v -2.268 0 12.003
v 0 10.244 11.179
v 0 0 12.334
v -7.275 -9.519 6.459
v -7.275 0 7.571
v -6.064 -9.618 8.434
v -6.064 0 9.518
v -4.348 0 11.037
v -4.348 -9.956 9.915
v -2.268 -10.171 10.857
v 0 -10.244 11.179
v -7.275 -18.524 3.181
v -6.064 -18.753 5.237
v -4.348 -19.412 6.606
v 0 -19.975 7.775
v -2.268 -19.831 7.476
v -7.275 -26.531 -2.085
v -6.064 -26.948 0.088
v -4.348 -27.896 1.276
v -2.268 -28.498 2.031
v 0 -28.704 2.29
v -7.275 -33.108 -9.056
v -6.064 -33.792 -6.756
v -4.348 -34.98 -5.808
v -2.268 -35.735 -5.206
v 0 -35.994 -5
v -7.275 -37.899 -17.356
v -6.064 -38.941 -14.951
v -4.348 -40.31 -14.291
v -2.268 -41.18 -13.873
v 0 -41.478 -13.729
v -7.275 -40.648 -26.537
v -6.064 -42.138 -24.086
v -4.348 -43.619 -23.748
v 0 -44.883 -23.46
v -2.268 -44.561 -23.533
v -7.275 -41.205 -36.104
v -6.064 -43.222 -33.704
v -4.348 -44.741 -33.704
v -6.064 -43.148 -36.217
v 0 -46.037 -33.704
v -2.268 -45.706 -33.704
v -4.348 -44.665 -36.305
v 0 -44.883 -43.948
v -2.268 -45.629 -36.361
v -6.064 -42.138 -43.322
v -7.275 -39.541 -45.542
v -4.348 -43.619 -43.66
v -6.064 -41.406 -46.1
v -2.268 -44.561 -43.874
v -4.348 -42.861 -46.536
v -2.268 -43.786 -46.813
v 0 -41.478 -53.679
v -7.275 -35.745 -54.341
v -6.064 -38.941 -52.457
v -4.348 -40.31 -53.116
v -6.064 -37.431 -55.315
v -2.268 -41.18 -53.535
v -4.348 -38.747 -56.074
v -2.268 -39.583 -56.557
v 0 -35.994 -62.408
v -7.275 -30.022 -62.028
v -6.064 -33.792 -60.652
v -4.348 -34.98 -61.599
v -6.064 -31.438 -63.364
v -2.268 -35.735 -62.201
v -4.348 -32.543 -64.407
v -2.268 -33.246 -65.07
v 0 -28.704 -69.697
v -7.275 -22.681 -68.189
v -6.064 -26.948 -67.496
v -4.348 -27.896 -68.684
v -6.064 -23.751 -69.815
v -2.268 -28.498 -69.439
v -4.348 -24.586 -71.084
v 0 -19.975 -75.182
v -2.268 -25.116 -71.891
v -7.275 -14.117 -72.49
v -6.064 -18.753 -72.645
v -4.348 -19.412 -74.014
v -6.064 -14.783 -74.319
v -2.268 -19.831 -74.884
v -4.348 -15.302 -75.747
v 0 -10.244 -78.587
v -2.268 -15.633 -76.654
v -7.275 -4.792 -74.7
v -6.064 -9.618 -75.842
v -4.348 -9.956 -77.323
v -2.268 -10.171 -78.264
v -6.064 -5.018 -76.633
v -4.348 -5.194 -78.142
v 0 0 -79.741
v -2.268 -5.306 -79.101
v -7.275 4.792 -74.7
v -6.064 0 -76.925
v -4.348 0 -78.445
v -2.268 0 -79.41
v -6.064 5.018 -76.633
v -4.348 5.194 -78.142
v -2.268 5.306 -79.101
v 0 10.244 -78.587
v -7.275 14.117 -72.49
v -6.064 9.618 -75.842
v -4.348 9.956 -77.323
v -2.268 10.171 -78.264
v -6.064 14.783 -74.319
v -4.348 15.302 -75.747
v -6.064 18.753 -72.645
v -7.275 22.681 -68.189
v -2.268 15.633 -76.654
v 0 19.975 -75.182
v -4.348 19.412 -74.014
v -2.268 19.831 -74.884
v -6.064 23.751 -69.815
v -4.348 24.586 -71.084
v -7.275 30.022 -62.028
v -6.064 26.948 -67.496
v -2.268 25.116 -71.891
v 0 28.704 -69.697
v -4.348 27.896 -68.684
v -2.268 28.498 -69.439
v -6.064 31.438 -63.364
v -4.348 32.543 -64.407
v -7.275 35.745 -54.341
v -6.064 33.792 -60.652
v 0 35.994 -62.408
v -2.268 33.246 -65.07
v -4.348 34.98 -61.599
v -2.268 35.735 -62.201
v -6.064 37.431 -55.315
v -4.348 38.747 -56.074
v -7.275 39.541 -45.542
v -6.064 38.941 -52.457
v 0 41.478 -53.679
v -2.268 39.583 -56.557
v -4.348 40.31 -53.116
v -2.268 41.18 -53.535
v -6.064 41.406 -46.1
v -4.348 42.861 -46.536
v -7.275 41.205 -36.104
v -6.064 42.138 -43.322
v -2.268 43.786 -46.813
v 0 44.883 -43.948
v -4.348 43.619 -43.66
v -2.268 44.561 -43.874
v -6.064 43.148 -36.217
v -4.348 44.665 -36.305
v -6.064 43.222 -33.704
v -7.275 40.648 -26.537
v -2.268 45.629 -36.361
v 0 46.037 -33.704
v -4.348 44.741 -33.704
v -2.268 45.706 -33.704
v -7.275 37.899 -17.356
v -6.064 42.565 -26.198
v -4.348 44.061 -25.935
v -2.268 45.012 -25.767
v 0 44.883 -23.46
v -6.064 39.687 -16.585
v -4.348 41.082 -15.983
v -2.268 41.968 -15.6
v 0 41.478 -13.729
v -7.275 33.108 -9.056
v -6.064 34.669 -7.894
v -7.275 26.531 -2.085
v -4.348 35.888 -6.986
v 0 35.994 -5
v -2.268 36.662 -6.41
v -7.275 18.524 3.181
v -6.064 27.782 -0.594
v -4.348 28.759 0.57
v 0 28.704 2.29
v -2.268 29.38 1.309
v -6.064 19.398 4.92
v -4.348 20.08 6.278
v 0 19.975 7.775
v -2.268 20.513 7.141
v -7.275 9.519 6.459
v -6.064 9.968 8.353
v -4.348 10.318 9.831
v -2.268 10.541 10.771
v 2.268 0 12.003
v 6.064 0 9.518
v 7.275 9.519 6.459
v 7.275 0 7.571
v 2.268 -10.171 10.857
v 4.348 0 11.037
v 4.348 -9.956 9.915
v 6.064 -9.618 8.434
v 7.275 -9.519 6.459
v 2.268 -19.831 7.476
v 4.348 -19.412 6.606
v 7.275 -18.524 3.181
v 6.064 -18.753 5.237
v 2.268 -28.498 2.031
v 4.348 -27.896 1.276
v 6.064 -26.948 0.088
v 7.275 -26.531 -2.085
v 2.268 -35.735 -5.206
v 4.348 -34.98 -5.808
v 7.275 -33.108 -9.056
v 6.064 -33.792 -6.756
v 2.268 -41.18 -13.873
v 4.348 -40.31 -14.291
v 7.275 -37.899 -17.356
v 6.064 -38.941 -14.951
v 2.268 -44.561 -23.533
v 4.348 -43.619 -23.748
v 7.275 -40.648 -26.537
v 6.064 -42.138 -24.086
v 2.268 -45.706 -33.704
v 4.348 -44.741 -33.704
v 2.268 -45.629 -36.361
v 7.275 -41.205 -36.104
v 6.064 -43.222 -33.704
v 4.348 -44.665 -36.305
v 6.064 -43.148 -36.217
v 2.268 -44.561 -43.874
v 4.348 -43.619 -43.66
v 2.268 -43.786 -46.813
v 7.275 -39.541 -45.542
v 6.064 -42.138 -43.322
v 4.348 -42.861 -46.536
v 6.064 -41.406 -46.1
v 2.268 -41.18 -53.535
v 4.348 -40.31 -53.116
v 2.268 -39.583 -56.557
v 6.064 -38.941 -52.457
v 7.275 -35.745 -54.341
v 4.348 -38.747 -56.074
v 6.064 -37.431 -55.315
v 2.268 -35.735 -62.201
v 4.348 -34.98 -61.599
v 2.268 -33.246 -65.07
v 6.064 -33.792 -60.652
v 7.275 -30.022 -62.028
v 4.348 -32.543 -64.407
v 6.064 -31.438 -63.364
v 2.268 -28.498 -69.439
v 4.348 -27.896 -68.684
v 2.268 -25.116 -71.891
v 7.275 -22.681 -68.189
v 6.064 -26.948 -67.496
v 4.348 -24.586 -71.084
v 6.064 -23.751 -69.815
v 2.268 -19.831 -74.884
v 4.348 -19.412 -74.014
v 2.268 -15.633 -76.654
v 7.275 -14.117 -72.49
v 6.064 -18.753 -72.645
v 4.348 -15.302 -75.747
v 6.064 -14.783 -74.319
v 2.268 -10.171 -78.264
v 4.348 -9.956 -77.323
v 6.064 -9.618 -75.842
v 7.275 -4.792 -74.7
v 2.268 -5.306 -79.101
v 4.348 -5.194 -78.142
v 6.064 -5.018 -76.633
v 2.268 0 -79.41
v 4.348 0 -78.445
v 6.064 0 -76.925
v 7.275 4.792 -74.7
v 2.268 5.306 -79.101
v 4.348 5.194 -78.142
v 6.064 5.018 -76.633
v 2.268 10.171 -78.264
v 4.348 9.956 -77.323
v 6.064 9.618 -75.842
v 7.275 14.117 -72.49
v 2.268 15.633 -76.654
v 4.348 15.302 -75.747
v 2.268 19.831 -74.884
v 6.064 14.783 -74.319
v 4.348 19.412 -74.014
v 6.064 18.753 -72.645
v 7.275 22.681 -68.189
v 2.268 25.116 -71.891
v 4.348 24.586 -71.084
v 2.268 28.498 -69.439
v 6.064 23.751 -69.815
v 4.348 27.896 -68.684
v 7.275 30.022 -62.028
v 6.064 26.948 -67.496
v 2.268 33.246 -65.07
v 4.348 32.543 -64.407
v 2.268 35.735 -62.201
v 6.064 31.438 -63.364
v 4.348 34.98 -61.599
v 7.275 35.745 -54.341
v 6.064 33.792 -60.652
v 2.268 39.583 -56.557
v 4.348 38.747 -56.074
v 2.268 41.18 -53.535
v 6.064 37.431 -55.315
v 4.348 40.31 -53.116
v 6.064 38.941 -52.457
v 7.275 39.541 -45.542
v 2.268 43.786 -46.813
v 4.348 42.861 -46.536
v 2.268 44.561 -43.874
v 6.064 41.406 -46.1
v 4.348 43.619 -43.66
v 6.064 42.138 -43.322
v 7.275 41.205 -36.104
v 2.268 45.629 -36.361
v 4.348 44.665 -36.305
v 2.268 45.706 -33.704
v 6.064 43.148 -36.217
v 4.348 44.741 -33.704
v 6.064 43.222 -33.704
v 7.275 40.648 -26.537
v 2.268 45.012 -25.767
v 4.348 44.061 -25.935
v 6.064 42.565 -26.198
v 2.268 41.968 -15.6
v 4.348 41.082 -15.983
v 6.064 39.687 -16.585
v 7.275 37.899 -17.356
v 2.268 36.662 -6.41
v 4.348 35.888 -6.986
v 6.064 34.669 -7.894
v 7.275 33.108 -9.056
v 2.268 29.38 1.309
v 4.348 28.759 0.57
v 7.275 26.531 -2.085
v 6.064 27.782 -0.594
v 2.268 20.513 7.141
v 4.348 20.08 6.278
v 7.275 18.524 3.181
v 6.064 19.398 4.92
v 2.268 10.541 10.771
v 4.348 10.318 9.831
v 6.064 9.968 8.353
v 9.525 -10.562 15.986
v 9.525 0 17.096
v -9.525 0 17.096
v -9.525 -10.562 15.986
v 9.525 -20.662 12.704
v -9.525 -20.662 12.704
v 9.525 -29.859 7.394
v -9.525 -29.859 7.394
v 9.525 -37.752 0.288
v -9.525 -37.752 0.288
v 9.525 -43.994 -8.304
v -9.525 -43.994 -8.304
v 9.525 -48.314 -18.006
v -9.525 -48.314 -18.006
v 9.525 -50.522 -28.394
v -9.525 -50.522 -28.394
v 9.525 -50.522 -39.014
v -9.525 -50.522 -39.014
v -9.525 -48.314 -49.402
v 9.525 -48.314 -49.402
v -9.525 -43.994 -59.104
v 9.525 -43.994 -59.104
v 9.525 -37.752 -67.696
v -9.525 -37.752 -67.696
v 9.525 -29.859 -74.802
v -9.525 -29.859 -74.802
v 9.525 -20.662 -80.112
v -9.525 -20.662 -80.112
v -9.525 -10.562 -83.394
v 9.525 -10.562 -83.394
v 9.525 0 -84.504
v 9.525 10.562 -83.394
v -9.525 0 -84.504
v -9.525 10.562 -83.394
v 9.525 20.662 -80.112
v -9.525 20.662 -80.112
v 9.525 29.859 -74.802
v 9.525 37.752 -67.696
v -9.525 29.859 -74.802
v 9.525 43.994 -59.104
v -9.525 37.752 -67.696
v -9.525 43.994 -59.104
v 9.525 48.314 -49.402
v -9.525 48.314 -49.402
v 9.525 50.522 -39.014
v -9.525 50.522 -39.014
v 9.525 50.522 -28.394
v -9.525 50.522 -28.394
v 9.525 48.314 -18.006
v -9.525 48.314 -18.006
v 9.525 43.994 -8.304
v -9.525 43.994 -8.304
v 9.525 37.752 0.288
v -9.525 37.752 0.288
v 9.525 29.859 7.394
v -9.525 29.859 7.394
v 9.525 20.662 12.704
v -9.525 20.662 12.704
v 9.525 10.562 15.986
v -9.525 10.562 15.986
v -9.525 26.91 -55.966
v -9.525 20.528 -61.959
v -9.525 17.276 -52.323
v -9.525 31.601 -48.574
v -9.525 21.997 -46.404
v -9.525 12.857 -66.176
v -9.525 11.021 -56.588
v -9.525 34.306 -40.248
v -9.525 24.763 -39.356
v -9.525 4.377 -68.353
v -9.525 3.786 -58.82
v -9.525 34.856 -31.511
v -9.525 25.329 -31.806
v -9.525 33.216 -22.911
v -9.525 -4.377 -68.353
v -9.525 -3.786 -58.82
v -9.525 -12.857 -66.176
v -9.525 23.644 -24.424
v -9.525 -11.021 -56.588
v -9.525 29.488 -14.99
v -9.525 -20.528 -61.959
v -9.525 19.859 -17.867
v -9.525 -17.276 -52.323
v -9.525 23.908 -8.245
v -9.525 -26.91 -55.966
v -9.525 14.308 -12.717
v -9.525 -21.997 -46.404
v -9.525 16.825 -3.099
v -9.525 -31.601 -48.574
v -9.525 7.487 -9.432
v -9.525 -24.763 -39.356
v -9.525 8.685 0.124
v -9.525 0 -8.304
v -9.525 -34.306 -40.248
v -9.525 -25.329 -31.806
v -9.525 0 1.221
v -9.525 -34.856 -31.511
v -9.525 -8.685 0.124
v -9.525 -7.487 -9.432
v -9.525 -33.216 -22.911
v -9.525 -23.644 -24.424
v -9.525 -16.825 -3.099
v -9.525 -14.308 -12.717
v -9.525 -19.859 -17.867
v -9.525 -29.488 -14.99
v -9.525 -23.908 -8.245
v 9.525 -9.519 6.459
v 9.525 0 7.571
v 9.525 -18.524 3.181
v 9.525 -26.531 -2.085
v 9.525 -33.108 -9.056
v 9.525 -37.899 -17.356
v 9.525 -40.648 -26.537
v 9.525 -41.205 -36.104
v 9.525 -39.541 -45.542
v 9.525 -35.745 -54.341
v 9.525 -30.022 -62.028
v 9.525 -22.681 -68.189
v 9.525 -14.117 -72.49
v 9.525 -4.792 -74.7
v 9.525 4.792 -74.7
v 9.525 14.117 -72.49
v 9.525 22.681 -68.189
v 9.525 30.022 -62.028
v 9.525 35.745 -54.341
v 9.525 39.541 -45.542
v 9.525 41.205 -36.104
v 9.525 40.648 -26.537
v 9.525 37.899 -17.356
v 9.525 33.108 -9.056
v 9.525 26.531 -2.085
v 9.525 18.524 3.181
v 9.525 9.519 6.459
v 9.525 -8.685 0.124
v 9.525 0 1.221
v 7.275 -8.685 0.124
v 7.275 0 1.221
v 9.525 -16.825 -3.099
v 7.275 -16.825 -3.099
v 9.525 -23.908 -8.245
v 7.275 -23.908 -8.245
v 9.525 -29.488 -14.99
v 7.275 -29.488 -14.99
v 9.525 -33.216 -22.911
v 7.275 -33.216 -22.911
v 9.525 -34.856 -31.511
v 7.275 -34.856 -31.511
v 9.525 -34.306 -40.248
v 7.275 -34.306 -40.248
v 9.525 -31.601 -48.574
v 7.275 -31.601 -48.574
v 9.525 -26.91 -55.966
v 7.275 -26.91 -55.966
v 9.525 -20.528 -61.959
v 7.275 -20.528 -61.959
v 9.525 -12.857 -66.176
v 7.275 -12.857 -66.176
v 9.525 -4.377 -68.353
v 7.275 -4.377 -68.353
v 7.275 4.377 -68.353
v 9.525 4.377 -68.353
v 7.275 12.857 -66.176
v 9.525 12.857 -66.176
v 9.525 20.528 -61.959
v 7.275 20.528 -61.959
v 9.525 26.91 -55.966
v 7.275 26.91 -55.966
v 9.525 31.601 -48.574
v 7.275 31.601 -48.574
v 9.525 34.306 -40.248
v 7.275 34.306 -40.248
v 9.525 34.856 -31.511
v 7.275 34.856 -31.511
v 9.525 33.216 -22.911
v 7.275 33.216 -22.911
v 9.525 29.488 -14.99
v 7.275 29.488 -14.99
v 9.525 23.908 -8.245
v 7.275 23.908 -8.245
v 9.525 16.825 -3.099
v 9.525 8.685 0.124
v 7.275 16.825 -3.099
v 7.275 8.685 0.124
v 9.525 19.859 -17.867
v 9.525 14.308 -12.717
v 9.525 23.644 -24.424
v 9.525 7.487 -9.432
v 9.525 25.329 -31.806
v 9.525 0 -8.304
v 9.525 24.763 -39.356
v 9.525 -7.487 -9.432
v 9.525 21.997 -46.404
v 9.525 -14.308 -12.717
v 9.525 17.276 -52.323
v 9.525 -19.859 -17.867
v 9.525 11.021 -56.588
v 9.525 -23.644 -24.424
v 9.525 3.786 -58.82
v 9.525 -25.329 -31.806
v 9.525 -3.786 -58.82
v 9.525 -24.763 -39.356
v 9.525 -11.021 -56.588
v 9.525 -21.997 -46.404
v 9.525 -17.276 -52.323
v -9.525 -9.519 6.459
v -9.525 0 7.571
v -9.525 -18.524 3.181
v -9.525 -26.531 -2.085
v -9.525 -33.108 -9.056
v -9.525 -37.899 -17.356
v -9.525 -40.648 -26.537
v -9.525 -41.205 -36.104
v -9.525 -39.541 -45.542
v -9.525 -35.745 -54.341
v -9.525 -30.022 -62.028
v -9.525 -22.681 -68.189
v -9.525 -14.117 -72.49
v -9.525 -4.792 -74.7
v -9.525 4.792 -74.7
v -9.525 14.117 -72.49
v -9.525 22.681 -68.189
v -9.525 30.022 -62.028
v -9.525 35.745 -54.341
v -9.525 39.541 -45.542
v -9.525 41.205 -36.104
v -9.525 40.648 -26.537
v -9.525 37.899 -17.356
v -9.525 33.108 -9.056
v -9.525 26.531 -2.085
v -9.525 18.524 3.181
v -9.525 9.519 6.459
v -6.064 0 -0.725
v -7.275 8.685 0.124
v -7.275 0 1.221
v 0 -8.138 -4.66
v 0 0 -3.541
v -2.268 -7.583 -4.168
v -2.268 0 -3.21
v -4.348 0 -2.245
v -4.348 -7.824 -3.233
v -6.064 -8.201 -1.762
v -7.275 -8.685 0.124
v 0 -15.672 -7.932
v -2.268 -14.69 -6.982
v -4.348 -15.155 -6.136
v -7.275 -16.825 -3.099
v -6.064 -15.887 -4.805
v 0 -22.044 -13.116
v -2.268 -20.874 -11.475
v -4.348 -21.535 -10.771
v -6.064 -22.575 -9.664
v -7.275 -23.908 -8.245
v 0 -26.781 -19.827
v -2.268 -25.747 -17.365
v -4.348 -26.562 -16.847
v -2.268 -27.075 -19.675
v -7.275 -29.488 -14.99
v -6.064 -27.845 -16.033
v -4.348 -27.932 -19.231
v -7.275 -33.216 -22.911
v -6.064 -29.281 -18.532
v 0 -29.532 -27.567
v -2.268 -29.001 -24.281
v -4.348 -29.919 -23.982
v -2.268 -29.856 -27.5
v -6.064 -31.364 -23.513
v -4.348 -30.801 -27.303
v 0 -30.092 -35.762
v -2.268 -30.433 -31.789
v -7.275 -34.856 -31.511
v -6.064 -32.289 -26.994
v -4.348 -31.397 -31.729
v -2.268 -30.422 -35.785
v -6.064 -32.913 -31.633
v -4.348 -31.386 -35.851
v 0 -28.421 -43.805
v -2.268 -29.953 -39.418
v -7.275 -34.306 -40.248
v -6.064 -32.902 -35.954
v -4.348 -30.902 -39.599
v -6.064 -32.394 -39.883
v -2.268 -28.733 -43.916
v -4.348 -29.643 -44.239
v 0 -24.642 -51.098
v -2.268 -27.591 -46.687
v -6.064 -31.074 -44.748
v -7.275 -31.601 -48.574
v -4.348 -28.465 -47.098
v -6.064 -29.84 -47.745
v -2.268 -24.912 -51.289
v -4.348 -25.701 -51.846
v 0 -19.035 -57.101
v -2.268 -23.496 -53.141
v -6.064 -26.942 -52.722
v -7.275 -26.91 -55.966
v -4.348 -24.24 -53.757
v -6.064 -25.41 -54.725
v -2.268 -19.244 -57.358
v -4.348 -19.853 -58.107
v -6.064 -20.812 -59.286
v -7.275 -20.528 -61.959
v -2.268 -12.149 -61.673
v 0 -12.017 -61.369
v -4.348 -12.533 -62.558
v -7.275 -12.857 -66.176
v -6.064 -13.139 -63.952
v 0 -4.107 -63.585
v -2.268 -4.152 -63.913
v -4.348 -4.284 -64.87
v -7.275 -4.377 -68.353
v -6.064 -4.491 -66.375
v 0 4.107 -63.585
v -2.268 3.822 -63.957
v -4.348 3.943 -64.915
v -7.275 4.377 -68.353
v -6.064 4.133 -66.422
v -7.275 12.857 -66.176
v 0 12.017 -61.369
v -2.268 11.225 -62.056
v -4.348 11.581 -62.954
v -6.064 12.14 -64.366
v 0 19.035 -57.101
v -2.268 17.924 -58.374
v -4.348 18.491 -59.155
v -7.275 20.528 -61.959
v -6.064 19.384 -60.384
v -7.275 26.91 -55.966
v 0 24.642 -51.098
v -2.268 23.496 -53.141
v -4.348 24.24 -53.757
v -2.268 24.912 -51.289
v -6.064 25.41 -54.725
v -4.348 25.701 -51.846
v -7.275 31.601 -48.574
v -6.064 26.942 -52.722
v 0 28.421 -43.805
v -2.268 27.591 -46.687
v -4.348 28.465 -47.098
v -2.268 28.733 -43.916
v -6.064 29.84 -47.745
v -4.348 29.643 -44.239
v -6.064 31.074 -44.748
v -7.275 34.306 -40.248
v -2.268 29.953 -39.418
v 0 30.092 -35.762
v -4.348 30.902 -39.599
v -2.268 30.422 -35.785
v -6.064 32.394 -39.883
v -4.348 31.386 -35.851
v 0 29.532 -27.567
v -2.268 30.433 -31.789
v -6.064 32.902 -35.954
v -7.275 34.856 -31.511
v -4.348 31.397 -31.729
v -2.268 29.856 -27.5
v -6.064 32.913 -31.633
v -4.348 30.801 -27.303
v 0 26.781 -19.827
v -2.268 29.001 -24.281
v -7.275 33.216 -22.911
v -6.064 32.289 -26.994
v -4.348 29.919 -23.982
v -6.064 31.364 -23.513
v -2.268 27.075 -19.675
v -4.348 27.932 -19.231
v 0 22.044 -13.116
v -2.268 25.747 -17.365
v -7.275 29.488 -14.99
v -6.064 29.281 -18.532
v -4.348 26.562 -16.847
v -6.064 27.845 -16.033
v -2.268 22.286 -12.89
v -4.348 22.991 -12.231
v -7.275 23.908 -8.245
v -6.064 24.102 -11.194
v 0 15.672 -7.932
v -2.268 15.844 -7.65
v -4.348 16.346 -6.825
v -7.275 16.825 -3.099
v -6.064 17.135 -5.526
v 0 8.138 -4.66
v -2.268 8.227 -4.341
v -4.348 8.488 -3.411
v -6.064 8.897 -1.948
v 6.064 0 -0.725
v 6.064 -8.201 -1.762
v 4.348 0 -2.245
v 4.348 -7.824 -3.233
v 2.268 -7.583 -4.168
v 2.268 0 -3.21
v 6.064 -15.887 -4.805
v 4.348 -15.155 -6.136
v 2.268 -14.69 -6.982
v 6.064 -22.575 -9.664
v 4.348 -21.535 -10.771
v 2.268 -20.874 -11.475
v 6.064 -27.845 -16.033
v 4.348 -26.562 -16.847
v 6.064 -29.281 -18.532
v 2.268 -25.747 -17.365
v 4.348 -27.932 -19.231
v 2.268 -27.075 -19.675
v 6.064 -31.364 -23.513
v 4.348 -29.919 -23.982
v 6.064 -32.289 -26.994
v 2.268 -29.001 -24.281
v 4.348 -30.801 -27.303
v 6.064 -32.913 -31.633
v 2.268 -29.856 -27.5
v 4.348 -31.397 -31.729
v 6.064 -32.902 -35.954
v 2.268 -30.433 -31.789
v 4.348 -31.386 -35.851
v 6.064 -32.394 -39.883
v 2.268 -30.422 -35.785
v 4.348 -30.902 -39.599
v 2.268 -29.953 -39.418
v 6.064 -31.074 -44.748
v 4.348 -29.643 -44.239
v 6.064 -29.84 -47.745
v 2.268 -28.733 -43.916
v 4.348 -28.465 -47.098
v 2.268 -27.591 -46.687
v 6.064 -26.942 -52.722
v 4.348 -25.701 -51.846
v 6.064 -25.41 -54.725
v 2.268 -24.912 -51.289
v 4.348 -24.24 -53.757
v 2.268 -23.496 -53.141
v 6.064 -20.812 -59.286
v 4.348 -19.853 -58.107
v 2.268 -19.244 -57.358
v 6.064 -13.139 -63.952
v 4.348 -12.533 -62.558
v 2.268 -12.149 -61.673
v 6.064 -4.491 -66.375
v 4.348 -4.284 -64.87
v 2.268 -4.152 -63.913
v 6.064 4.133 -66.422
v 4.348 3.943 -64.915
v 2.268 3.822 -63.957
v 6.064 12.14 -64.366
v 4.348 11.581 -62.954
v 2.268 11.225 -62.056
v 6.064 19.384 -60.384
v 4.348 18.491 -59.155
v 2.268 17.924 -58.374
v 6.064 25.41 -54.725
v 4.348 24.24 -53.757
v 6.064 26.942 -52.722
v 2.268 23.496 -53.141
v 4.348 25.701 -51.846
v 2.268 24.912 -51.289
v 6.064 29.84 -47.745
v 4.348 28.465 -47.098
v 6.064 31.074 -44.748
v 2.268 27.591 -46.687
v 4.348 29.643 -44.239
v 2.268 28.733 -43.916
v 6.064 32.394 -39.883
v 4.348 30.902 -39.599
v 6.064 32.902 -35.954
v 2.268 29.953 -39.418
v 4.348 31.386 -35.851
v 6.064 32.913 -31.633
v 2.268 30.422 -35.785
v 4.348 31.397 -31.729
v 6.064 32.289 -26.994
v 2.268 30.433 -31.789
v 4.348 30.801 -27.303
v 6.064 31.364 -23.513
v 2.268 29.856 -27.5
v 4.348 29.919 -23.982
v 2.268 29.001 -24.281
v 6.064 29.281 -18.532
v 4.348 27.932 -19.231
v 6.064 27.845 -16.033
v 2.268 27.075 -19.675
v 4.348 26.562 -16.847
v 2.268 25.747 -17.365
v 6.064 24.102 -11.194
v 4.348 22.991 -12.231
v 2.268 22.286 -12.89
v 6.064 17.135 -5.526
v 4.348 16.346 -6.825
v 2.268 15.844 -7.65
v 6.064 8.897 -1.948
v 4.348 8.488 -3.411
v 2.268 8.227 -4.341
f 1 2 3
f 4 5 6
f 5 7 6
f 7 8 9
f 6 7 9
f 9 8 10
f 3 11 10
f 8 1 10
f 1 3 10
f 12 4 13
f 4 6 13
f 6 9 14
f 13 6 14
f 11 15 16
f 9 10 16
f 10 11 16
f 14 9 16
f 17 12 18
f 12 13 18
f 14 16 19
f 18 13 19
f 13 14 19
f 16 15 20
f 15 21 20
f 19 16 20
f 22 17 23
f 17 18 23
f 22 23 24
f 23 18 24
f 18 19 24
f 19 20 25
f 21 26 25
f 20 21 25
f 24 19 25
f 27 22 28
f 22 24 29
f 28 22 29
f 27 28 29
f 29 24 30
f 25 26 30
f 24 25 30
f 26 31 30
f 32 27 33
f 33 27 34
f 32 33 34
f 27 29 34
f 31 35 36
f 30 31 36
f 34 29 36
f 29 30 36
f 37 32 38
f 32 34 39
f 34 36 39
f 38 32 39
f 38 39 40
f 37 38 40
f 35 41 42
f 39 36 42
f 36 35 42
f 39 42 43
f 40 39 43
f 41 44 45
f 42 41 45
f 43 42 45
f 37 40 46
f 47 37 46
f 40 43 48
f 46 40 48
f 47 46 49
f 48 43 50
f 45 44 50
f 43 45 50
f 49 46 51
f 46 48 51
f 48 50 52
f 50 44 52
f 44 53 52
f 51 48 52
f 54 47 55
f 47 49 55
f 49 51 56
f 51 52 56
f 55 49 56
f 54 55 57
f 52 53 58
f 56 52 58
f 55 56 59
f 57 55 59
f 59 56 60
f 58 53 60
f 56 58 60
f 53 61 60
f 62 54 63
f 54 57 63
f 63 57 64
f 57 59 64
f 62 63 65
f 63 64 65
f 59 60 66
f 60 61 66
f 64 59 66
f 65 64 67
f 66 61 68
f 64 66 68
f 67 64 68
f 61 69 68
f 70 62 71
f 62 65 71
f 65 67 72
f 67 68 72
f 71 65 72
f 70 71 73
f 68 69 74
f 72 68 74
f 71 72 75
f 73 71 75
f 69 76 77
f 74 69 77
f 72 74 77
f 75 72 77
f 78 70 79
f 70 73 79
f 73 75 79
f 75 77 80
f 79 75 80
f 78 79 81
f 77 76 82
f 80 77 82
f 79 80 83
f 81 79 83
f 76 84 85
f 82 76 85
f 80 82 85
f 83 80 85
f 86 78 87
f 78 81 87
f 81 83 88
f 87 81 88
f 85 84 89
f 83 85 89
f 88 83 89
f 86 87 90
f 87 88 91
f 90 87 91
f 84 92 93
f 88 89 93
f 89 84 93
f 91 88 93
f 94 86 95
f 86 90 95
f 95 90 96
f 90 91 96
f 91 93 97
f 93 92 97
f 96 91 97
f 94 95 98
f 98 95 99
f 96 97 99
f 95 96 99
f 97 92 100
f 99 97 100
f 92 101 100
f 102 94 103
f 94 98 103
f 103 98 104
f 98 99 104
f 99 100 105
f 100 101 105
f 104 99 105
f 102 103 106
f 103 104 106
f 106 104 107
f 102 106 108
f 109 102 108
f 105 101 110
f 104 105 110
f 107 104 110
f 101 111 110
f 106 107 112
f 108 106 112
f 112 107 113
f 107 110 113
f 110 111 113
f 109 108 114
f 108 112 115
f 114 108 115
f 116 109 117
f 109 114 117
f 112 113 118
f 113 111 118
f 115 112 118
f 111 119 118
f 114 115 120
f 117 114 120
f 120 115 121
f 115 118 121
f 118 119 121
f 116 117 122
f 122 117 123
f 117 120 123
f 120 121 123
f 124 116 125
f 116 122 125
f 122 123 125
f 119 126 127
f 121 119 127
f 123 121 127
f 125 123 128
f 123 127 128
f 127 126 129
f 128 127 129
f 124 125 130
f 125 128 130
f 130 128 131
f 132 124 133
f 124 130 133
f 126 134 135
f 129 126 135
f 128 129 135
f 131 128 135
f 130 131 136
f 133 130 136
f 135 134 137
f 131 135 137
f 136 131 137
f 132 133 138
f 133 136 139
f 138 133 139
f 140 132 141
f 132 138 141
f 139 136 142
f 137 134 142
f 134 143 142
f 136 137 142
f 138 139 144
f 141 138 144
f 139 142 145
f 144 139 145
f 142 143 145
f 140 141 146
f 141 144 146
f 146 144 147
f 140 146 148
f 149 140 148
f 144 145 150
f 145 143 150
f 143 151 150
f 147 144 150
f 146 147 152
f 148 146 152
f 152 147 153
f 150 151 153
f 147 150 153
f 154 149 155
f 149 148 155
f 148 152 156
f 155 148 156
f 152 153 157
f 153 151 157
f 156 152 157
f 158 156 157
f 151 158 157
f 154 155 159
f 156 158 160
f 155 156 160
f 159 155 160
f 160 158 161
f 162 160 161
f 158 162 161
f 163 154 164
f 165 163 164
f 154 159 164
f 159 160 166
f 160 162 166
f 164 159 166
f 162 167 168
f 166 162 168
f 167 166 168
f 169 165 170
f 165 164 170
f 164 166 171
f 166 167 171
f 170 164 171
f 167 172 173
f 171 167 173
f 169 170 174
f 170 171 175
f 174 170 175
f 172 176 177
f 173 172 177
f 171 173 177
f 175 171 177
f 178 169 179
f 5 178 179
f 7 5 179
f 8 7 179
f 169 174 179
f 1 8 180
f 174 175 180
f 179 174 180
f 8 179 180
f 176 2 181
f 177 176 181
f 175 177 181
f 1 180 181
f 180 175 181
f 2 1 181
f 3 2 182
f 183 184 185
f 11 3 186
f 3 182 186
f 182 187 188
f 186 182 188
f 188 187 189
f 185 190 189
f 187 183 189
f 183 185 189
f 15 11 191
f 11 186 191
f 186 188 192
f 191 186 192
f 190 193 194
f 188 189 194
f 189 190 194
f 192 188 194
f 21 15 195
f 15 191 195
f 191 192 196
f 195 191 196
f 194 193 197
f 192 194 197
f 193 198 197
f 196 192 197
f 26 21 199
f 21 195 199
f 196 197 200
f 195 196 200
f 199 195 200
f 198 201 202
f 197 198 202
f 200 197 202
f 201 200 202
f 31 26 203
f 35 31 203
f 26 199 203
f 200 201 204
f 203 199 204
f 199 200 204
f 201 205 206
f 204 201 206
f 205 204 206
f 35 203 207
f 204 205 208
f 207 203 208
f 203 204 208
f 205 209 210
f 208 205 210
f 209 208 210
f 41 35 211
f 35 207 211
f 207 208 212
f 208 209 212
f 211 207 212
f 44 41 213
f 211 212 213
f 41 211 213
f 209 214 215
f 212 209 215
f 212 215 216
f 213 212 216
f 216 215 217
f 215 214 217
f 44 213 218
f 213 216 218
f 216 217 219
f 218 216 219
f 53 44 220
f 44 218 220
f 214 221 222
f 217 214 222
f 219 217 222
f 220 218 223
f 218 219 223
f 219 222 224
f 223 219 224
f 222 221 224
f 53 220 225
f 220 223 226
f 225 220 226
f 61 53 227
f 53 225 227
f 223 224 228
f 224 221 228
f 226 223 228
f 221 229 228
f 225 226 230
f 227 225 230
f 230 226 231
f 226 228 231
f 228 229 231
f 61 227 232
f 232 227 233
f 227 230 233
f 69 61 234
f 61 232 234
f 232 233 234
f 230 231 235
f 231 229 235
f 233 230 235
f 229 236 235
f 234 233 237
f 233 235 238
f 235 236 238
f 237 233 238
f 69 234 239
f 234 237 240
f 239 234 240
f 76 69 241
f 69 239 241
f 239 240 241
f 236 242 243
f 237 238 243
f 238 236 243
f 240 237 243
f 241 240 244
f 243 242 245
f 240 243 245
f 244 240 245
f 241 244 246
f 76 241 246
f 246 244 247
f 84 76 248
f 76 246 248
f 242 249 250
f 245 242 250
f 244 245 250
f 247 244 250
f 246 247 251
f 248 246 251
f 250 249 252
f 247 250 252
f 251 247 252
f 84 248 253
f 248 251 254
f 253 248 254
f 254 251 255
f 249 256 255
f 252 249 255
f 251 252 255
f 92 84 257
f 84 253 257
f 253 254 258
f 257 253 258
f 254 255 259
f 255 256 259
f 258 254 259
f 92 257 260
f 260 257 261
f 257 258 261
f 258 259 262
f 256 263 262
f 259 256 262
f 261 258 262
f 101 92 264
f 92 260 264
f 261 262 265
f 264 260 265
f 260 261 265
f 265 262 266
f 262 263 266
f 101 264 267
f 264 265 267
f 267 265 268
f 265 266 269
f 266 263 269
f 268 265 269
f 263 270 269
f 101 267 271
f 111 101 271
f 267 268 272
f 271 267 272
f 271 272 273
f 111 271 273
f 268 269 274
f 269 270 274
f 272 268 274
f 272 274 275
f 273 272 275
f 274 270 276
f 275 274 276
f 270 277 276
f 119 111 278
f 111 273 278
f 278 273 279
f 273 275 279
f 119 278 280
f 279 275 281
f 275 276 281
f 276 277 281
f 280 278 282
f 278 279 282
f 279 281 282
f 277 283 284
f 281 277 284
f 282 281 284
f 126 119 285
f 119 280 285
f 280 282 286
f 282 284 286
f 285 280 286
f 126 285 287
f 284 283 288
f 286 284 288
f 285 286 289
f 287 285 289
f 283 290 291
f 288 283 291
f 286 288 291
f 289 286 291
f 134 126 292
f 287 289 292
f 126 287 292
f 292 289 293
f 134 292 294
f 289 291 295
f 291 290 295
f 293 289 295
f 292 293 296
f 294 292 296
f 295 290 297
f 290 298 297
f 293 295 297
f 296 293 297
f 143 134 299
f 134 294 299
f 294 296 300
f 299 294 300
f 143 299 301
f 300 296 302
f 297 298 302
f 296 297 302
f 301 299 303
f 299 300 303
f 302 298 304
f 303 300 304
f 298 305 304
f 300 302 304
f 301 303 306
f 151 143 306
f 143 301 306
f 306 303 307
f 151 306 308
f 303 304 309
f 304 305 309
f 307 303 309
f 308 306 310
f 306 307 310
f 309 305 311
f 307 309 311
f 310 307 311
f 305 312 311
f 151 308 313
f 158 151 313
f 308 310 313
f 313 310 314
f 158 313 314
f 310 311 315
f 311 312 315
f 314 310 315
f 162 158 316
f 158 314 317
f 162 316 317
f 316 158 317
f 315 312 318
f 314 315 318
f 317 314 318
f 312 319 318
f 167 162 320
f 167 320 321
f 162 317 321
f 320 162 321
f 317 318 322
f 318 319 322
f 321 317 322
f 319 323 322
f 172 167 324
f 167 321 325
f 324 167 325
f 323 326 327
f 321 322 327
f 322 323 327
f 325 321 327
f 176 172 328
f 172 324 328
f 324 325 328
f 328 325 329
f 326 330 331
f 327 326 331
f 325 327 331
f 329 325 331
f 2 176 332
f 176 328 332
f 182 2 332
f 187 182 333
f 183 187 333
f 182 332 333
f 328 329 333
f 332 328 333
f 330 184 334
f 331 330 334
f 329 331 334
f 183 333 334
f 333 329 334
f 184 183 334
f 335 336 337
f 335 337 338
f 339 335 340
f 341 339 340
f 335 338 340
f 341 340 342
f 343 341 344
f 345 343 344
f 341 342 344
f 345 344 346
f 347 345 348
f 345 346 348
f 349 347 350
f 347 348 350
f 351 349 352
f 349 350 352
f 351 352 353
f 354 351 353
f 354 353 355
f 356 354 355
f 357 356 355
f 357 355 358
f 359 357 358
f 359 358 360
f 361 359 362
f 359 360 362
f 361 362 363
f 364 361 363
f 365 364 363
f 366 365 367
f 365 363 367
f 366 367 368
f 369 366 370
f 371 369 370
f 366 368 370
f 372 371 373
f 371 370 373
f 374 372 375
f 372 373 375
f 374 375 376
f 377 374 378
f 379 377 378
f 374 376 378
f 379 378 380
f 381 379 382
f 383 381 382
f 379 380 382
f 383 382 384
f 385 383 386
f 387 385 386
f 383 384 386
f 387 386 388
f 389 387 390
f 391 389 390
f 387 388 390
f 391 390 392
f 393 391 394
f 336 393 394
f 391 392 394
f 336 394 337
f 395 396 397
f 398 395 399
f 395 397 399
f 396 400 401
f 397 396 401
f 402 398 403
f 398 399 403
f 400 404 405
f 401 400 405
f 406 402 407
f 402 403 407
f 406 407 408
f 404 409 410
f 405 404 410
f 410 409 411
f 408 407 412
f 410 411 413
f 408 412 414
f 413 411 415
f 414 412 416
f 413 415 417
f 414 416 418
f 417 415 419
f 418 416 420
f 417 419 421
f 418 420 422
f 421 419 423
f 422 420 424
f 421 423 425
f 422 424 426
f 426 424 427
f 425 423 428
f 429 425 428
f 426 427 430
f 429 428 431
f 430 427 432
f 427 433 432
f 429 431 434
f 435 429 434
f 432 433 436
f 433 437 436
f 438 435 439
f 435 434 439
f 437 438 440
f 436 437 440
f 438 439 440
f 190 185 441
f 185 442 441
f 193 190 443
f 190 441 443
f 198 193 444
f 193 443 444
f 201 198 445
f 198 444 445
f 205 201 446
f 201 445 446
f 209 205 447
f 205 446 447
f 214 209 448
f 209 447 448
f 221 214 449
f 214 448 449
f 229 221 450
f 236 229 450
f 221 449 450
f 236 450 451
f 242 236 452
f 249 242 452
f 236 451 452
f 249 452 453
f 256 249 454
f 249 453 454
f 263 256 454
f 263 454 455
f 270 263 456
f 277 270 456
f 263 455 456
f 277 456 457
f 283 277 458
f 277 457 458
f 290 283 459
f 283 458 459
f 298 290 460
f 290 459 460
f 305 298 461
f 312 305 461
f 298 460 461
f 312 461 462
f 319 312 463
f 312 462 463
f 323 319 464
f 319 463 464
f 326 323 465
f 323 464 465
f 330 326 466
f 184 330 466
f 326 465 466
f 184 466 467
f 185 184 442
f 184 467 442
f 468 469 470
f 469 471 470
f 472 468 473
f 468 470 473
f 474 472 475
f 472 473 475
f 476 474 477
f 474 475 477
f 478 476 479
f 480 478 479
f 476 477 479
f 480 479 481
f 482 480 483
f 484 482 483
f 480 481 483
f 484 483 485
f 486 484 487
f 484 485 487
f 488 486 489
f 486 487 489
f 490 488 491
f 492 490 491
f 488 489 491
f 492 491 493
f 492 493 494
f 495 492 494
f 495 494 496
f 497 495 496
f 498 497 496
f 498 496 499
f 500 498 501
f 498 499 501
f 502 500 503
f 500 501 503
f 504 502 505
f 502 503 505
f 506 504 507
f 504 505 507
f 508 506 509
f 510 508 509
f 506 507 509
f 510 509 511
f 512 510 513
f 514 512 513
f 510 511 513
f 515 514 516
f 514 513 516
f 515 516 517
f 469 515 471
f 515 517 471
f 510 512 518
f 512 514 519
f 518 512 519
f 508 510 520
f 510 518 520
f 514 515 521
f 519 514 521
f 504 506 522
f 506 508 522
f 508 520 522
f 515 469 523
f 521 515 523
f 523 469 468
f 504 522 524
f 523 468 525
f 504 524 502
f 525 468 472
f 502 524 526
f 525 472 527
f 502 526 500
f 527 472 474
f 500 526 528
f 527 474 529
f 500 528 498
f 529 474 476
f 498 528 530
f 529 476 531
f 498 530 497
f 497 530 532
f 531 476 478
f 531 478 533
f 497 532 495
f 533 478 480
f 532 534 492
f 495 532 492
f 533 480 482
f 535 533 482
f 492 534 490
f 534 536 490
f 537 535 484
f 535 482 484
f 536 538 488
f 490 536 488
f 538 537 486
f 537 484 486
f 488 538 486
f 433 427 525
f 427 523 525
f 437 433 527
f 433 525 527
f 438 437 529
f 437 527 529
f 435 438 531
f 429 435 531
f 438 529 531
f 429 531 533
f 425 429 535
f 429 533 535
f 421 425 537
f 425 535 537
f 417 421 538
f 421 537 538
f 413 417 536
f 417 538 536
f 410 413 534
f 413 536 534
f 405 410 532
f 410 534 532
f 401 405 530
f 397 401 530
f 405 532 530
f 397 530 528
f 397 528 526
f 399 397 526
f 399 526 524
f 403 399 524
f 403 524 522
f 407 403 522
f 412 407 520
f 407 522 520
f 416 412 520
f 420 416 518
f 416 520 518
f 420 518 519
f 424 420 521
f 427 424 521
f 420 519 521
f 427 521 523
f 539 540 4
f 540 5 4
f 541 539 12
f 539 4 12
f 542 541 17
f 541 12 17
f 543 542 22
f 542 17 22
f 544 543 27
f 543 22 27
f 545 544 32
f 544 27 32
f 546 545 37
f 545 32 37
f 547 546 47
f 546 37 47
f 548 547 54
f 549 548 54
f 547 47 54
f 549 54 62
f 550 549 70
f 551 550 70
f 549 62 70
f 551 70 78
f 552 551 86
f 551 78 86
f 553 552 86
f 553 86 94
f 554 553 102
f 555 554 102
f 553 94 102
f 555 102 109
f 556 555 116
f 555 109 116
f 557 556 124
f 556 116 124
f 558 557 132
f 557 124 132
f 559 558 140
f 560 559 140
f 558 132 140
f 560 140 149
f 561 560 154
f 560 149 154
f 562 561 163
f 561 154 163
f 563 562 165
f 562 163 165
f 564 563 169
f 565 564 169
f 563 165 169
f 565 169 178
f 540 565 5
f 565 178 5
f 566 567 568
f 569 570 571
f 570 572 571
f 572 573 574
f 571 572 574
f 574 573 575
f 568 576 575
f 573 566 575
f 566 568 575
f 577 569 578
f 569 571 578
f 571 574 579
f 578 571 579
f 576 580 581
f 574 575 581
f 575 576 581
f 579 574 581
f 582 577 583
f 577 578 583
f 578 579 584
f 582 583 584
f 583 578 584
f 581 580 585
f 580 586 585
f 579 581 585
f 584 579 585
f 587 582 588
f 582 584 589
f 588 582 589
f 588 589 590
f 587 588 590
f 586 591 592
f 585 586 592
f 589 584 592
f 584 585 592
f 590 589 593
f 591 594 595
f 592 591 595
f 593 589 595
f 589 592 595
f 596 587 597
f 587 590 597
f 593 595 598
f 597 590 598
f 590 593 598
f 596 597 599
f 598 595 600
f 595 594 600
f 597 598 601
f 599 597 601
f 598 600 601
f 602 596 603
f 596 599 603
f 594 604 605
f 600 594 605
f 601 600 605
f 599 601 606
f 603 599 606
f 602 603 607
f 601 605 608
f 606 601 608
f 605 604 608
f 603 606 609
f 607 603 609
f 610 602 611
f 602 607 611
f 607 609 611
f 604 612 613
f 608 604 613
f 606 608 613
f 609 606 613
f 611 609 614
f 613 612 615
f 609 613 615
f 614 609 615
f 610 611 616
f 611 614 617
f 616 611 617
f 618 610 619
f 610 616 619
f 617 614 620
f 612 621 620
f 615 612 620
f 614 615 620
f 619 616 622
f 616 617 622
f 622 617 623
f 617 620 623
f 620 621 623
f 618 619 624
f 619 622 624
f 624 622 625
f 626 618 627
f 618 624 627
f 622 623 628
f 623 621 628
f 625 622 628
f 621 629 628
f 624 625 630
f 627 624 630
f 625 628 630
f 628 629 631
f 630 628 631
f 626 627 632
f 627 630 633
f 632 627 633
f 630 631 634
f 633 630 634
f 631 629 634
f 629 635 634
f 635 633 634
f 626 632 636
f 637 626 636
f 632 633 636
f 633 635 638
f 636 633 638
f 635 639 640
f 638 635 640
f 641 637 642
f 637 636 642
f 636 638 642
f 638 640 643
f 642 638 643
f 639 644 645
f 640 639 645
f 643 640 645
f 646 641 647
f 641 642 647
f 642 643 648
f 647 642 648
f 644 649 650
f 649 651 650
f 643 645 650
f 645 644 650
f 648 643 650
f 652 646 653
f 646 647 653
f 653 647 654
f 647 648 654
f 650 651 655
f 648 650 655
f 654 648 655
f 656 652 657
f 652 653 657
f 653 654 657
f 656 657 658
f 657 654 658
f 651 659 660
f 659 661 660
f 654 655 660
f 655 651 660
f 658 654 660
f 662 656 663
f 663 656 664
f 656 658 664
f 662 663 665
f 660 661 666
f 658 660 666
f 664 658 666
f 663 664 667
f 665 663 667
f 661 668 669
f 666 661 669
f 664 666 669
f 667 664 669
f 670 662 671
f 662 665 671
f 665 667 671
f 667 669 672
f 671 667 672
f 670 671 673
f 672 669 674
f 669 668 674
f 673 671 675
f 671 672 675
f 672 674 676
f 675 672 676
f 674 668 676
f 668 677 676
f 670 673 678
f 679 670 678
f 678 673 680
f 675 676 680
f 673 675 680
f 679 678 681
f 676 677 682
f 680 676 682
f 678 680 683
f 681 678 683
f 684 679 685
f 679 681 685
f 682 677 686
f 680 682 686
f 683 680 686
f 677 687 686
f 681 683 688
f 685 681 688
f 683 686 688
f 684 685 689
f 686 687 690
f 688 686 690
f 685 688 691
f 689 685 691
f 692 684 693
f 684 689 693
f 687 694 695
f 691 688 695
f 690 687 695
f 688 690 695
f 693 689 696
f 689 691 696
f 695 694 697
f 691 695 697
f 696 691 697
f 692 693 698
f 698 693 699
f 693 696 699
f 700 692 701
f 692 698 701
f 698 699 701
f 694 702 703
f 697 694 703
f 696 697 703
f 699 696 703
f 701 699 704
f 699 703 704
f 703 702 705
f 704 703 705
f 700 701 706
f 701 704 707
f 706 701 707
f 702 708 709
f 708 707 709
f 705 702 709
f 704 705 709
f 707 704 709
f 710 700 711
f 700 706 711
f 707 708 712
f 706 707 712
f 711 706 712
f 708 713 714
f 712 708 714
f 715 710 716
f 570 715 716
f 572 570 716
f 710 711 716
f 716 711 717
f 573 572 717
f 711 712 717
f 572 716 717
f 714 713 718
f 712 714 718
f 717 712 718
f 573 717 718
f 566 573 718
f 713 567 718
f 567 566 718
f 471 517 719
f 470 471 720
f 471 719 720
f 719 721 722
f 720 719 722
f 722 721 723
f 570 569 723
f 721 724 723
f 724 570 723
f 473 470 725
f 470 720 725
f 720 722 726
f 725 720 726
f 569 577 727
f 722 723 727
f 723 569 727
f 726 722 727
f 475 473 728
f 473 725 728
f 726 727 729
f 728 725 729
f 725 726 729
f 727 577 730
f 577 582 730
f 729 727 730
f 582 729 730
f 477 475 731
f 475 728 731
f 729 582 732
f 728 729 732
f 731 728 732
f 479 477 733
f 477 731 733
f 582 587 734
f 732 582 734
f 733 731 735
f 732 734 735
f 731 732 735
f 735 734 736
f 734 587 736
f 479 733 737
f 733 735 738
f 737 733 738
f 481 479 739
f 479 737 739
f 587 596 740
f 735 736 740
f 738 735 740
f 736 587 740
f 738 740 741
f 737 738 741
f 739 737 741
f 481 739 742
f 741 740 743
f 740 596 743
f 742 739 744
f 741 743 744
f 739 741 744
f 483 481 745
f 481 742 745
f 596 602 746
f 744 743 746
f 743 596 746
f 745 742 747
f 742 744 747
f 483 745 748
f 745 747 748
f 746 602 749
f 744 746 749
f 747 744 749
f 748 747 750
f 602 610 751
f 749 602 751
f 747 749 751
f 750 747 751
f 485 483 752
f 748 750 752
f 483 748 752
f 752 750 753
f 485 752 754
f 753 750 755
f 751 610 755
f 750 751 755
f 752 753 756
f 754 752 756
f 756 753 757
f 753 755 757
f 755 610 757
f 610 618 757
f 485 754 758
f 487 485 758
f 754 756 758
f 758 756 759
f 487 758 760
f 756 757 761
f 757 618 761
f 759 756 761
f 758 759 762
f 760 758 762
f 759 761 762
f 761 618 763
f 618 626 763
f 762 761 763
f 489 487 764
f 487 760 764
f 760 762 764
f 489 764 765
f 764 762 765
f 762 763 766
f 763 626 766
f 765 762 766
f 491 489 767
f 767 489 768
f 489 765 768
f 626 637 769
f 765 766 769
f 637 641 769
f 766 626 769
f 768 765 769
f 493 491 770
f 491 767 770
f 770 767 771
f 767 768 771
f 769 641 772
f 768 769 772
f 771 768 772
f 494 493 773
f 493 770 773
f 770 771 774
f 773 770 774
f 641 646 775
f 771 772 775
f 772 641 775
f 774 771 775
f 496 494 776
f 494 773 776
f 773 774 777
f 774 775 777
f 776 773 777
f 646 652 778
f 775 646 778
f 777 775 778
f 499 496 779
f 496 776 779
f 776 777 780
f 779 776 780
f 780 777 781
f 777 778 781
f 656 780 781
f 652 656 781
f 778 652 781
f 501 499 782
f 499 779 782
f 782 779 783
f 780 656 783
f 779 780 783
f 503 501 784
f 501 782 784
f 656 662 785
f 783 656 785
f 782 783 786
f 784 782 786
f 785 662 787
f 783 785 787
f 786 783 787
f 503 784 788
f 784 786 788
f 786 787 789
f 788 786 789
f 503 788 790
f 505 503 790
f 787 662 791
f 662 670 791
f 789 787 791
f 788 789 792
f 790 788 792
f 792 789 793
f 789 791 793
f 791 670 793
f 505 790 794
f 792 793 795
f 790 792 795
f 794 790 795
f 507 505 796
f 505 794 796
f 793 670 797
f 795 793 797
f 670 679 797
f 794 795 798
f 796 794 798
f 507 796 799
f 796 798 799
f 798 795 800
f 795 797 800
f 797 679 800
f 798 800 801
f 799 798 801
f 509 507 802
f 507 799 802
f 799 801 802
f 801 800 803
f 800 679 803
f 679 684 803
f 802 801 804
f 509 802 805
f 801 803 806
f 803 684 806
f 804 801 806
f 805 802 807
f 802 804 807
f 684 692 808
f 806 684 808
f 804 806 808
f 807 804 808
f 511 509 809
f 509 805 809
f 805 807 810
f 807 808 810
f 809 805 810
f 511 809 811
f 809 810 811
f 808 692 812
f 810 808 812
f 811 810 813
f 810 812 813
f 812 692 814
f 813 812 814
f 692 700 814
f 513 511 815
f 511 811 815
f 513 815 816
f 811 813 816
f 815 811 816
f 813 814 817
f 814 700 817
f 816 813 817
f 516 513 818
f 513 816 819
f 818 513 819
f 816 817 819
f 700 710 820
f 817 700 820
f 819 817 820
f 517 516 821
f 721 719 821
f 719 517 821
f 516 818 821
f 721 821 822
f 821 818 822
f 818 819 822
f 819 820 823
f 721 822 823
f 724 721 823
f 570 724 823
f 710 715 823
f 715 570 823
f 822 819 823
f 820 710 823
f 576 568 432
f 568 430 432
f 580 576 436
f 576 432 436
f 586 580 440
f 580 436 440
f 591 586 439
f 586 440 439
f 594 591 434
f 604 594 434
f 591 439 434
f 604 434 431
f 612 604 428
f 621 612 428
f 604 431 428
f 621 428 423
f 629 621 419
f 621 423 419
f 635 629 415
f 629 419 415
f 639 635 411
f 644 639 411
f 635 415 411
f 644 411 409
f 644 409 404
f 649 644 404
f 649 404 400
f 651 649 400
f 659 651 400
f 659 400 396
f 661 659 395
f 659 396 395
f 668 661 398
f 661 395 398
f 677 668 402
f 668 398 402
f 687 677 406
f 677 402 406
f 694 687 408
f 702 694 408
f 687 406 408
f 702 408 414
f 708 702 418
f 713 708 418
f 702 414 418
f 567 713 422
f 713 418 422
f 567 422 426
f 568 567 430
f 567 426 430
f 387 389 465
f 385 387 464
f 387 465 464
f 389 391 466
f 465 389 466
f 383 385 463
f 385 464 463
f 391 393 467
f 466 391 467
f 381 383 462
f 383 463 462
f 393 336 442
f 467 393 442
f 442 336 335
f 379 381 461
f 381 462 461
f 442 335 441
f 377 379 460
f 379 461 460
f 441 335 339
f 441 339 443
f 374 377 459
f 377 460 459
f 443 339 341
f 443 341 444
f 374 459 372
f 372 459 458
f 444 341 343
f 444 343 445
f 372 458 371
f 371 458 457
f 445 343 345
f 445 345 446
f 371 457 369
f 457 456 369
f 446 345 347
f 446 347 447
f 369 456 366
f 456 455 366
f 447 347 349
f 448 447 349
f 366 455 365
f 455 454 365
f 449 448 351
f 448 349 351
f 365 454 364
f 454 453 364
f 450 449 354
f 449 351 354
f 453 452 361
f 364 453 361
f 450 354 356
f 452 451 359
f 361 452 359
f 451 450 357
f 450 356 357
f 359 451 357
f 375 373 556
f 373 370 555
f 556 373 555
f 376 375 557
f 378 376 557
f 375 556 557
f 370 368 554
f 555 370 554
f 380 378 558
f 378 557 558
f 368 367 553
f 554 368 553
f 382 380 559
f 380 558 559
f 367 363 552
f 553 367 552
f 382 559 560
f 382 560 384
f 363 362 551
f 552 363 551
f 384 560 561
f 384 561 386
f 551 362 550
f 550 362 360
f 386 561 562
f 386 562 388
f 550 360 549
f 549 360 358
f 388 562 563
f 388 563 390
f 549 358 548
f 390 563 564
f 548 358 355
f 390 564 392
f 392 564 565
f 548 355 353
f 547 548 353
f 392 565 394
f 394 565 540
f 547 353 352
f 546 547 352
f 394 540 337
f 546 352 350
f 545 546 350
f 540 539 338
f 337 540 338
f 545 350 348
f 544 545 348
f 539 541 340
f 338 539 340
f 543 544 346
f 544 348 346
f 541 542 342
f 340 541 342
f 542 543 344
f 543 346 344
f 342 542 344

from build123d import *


with BuildPart() as f1:
    # F0 (on Front) → F1 (revolve)
    with BuildSketch(Plane.XZ):
        with BuildLine():
            Line((9.525, 17.096154), (-9.525, 17.096154))
            Line((-9.525, 17.096154), (-9.525, 7.571154))
            Line((-9.525, 7.571154), (-7.274839, 7.571154))
            ThreePointArc((-7.274839, 7.571154), (-4.347548, 11.037143), (0, 12.333654))
            ThreePointArc((0, 12.333654), (4.347548, 11.037143), (7.274839, 7.571154))
            Line((7.274839, 7.571154), (9.525, 7.571154))
            Line((9.525, 7.571154), (9.525, 17.096154))
        make_face()
        with BuildLine():
            ThreePointArc((0, -3.541346), (-4.347548, -2.244835), (-7.274839, 1.221154))
            Line((-7.274839, 1.221154), (-9.525, 1.221154))
            Line((-9.525, 1.221154), (-9.525, -8.303846))
            Line((-9.525, -8.303846), (9.525, -8.303846))
            Line((9.525, -8.303846), (9.525, 1.221154))
            Line((9.525, 1.221154), (7.274839, 1.221154))
            ThreePointArc((7.274839, 1.221154), (4.347548, -2.244835), (0, -3.541346))
        make_face()
    revolve(axis=Axis((0, 0, -33.703846), (1, 0, 0)))


solid = f1.part
